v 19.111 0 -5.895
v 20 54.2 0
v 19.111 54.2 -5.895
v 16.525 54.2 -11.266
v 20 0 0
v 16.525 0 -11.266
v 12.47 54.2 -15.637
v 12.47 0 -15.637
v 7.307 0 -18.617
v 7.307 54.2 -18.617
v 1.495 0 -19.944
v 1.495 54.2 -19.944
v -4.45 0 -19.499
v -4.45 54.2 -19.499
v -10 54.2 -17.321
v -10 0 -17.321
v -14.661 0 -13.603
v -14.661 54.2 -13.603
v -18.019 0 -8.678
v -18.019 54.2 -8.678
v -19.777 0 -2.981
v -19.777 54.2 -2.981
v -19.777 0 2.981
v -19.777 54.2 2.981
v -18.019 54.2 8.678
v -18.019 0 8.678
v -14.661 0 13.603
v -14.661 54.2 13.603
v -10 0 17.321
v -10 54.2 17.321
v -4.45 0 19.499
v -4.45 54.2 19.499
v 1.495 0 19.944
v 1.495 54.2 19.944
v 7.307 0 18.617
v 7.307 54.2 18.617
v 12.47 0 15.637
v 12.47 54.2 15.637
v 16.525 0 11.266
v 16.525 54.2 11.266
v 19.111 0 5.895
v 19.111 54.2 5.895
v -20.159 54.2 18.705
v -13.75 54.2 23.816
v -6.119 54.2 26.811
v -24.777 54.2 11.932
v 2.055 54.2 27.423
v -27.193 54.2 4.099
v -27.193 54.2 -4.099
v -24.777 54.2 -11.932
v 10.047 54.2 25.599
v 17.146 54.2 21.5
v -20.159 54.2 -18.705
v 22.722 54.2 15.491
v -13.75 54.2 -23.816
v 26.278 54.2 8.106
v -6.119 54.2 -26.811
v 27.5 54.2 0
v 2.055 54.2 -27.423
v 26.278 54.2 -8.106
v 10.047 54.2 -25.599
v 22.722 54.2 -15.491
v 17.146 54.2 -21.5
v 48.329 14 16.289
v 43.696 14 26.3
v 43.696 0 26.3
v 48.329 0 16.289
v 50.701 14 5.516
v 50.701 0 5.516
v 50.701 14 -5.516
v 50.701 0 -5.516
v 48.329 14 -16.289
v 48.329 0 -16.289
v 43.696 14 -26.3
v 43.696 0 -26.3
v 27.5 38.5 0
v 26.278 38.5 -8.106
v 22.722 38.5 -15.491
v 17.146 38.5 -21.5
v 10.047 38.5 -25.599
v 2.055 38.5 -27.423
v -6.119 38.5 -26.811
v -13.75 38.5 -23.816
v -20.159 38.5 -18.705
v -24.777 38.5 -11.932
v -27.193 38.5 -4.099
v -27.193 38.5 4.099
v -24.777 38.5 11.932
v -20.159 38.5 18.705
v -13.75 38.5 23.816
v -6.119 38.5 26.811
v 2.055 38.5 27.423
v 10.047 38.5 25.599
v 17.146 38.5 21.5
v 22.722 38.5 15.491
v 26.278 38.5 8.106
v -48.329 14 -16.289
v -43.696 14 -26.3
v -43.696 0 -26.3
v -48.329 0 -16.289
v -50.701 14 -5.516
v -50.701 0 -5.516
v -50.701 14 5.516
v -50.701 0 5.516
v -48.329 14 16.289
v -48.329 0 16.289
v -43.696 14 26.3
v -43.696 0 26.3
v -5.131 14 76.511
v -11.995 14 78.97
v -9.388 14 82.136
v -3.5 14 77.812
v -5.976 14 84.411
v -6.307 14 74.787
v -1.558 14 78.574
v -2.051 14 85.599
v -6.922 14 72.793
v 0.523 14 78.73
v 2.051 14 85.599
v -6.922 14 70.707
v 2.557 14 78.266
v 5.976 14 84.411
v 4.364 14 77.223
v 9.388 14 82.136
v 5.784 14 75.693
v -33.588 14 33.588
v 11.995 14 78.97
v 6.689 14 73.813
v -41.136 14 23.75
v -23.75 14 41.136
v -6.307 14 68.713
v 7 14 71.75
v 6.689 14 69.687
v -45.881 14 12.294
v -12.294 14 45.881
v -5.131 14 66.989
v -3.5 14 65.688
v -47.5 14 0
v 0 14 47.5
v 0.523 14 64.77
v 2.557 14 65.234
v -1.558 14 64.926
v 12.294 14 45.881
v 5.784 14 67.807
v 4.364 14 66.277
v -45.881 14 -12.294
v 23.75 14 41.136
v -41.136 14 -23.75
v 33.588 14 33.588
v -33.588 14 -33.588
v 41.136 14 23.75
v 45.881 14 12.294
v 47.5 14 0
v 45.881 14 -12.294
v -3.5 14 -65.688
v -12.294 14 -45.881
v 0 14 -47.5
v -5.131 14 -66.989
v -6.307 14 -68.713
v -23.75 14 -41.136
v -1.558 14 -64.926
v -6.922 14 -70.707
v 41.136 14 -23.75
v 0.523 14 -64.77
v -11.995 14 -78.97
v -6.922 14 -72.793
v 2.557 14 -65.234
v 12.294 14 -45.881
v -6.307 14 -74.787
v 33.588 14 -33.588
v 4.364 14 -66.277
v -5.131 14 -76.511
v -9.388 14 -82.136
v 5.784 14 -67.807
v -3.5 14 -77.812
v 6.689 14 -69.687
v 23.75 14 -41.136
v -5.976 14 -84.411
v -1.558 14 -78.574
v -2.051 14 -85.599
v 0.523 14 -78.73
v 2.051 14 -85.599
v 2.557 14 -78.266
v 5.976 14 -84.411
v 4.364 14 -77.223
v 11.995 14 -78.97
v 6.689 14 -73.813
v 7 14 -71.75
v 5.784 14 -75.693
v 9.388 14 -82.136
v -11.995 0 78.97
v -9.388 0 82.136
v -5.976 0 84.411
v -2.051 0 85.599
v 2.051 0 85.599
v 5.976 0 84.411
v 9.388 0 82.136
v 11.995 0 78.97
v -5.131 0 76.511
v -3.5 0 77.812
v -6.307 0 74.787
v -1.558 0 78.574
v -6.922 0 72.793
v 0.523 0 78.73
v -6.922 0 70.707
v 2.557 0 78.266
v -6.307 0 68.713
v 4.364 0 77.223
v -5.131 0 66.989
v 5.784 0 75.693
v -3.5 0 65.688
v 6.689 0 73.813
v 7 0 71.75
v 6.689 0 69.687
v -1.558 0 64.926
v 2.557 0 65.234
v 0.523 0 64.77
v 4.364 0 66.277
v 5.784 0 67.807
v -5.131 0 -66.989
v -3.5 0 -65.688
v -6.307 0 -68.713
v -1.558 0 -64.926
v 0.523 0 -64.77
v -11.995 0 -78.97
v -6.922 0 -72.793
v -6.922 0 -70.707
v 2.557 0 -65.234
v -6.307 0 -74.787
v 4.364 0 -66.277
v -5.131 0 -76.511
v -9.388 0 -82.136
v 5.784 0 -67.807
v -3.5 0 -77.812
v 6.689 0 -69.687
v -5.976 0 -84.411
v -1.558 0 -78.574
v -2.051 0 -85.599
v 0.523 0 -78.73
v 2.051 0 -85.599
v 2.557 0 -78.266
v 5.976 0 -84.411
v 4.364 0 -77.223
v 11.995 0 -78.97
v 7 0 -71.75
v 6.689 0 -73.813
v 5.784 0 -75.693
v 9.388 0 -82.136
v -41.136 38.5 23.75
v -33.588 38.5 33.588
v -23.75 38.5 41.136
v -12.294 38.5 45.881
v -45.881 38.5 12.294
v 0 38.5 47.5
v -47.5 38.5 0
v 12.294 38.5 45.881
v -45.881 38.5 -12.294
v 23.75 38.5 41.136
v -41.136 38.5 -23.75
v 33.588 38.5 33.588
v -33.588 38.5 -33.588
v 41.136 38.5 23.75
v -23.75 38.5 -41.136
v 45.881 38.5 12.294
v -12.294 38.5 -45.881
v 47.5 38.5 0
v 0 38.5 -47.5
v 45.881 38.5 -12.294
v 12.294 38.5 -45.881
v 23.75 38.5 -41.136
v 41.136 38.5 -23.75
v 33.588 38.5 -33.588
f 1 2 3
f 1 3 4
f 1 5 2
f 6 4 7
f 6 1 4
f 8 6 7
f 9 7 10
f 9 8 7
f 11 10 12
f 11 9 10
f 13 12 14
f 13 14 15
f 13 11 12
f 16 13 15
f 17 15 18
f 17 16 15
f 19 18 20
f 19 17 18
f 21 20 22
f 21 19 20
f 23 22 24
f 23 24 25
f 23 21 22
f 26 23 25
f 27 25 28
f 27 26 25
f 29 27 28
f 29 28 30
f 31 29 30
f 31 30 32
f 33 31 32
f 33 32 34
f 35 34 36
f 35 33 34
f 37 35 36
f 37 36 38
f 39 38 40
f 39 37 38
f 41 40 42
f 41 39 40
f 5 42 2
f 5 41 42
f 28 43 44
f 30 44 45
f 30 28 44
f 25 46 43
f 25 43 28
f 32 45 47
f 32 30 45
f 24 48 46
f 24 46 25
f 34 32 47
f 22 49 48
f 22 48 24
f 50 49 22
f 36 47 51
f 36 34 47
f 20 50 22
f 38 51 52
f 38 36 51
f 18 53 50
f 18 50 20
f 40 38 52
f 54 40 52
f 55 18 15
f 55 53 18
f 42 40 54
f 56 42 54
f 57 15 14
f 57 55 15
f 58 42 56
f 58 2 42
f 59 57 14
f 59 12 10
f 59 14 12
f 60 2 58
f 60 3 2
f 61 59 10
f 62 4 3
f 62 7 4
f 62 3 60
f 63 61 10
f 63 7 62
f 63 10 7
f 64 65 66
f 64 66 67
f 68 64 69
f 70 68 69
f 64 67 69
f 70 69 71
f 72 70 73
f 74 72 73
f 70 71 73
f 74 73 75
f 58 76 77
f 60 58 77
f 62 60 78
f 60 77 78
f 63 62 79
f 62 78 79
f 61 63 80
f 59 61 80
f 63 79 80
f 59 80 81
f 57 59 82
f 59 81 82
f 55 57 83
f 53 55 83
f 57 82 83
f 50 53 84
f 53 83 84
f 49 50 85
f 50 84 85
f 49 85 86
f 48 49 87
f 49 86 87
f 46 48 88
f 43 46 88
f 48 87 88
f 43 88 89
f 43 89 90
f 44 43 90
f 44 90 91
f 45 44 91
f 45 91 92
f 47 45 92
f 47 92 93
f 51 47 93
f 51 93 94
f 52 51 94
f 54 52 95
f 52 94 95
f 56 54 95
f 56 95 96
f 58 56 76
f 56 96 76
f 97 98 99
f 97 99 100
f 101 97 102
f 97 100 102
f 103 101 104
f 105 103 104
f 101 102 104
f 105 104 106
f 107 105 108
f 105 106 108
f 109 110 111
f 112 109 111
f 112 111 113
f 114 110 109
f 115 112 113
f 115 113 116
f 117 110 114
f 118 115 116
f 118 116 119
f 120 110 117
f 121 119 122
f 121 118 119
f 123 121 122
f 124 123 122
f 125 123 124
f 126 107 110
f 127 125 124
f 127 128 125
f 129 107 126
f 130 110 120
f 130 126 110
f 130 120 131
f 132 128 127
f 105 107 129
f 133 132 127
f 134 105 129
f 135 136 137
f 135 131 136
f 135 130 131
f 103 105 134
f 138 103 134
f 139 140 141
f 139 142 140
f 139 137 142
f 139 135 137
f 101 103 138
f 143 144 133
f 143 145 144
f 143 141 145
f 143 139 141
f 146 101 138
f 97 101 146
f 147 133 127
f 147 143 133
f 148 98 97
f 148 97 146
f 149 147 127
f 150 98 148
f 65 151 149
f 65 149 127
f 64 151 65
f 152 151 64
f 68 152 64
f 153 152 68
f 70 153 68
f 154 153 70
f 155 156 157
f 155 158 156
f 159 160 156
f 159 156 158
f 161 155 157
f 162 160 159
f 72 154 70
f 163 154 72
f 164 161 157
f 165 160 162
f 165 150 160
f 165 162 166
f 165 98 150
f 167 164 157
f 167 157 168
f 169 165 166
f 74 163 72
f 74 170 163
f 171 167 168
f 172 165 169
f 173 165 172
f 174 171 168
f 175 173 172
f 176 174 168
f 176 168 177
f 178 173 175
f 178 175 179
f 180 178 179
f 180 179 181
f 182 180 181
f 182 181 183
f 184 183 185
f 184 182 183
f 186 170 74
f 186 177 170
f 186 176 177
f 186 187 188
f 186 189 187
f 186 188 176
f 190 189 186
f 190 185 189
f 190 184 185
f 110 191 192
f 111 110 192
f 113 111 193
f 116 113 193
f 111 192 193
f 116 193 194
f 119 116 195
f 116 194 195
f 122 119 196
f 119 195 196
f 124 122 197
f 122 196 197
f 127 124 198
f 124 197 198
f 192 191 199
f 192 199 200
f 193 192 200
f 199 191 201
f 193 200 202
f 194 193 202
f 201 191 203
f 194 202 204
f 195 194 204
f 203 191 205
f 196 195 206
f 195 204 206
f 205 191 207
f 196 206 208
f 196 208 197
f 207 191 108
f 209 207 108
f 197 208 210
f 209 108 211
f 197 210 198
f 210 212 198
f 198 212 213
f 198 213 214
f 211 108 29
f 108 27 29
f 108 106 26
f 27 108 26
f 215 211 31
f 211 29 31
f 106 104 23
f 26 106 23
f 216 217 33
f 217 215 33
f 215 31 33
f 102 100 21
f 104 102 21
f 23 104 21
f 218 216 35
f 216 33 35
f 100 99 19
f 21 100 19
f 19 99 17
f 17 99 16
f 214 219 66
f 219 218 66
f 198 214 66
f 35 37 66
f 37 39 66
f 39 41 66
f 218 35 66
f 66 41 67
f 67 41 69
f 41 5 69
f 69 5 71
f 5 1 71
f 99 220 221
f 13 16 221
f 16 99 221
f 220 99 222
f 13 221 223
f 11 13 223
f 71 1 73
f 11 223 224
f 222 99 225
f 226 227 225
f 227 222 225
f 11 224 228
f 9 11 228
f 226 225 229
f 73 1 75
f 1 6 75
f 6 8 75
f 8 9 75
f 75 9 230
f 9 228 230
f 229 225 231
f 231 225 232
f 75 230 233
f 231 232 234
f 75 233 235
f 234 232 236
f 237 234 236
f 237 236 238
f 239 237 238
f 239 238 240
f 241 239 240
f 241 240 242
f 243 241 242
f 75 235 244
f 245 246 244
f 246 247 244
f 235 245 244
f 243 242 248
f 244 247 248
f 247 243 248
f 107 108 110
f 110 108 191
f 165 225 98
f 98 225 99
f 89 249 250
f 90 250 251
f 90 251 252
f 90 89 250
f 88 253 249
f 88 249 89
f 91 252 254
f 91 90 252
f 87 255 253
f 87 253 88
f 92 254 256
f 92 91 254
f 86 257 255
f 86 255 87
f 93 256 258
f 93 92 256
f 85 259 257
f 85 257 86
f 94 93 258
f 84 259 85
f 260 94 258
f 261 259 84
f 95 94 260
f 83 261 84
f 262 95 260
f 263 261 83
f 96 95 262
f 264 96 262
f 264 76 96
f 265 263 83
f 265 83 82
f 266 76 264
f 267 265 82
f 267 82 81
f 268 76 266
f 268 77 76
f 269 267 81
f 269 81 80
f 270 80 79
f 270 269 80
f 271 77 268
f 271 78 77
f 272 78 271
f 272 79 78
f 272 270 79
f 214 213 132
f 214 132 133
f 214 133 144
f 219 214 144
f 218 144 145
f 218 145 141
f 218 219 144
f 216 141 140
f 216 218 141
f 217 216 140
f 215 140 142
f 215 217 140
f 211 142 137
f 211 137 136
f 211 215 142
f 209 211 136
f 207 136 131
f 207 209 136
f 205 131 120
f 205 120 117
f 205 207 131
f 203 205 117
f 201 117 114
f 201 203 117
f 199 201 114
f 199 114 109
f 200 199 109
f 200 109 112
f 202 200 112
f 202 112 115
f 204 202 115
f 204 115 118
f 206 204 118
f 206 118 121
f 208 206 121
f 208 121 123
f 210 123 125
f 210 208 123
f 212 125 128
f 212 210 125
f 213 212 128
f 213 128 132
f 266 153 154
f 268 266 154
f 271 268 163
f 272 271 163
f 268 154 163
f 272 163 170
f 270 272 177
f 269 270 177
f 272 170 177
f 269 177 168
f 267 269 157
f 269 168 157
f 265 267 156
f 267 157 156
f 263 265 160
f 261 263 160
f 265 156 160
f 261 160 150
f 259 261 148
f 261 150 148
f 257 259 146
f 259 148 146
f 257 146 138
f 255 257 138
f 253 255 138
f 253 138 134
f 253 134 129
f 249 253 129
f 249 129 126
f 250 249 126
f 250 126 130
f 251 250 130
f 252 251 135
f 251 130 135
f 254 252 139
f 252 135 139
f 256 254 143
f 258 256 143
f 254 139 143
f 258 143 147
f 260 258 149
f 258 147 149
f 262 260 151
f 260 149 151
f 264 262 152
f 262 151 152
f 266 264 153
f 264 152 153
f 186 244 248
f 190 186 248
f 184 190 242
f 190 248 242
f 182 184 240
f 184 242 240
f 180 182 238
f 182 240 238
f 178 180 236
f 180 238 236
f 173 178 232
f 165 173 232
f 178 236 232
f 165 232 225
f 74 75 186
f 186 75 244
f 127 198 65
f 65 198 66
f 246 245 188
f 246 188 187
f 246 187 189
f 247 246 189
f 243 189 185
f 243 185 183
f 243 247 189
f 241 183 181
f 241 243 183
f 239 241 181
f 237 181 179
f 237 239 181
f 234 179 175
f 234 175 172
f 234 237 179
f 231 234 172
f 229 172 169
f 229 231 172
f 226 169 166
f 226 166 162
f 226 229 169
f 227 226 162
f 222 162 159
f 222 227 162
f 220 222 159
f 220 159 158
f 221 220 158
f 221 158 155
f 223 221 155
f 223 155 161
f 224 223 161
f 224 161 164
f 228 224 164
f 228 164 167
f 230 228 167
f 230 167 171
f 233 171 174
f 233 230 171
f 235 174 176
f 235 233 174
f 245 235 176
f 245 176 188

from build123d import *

# Parameters (mm, degrees)
SKETCH1_R           = 14
SKETCH1_R_2         = 7
SKETCH1_R_3         = 51
SKETCH1_R_4         = 20
BOSS_EXTRUDE1_DEPTH = 14
SKETCH2_R           = 47.5
SKETCH2_R_2         = 20
BOSS_EXTRUDE2_DEPTH = 24.5
SKETCH3_R           = 27.5
SKETCH3_R_2         = 20
BOSS_EXTRUDE3_DEPTH = 15.7


with BuildPart() as part:
    # Sketch1 → Boss-Extrude1 (new body)
    with BuildSketch(Plane(origin=(0, 0, 0), x_dir=(1, 0, 0), z_dir=(0, 1, 0))):
        with Locations((0, 71.75)):
            Circle(SKETCH1_R)
        with Locations((0, 71.75)):
            Circle(SKETCH1_R_2, mode=Mode.SUBTRACT)
        with BuildLine():
            Line((43.695861674, 26.299651568), (11.99494242, 78.969512195))
            ThreePointArc((11.99494242, 78.969512195), (13.489425375, 75.496385332), (14, 71.75))
            ThreePointArc((14, 71.75), (-3.746385332, 58.260574625), (-11.99494242, 78.969512195))
            Line((-11.99494242, 78.969512195), (-43.695861674, 26.299651568))
            ThreePointArc((-43.695861674, 26.299651568), (0, 51), (43.695861674, 26.299651568))
        make_face()
        with BuildLine():
            ThreePointArc((43.695861674, -26.299651568), (0, -51), (-43.695861674, -26.299651568))
            Line((-43.695861674, -26.299651568), (-11.99494242, -78.969512195))
            ThreePointArc((-11.99494242, -78.969512195), (-3.746385332, -58.260574625), (14, -71.75))
            ThreePointArc((14, -71.75), (13.489425375, -75.496385332), (11.99494242, -78.969512195))
            Line((11.99494242, -78.969512195), (43.695861674, -26.299651568))
        make_face()
        with Locations((0, -71.75)):
            Circle(SKETCH1_R)
        with Locations((0, -71.75)):
            Circle(SKETCH1_R_2, mode=Mode.SUBTRACT)
        Circle(SKETCH1_R_3)
        Circle(SKETCH1_R_4, mode=Mode.SUBTRACT)
    extrude(amount=BOSS_EXTRUDE1_DEPTH)

    # Sketch2 → Boss-Extrude2 (add)
    with BuildSketch(Plane(origin=(0, 14, 0), x_dir=(1, 0, 0), z_dir=(0, 1, 0))):
        Circle(SKETCH2_R)
        Circle(SKETCH2_R_2, mode=Mode.SUBTRACT)
    extrude(amount=BOSS_EXTRUDE2_DEPTH)

    # Sketch3 → Boss-Extrude3 (add)
    with BuildSketch(Plane(origin=(0, 38.5, 0), x_dir=(1, 0, 0), z_dir=(0, 1, 0))):
        Circle(SKETCH3_R)
        Circle(SKETCH3_R_2, mode=Mode.SUBTRACT)
    extrude(amount=BOSS_EXTRUDE3_DEPTH)


solid = part.part
